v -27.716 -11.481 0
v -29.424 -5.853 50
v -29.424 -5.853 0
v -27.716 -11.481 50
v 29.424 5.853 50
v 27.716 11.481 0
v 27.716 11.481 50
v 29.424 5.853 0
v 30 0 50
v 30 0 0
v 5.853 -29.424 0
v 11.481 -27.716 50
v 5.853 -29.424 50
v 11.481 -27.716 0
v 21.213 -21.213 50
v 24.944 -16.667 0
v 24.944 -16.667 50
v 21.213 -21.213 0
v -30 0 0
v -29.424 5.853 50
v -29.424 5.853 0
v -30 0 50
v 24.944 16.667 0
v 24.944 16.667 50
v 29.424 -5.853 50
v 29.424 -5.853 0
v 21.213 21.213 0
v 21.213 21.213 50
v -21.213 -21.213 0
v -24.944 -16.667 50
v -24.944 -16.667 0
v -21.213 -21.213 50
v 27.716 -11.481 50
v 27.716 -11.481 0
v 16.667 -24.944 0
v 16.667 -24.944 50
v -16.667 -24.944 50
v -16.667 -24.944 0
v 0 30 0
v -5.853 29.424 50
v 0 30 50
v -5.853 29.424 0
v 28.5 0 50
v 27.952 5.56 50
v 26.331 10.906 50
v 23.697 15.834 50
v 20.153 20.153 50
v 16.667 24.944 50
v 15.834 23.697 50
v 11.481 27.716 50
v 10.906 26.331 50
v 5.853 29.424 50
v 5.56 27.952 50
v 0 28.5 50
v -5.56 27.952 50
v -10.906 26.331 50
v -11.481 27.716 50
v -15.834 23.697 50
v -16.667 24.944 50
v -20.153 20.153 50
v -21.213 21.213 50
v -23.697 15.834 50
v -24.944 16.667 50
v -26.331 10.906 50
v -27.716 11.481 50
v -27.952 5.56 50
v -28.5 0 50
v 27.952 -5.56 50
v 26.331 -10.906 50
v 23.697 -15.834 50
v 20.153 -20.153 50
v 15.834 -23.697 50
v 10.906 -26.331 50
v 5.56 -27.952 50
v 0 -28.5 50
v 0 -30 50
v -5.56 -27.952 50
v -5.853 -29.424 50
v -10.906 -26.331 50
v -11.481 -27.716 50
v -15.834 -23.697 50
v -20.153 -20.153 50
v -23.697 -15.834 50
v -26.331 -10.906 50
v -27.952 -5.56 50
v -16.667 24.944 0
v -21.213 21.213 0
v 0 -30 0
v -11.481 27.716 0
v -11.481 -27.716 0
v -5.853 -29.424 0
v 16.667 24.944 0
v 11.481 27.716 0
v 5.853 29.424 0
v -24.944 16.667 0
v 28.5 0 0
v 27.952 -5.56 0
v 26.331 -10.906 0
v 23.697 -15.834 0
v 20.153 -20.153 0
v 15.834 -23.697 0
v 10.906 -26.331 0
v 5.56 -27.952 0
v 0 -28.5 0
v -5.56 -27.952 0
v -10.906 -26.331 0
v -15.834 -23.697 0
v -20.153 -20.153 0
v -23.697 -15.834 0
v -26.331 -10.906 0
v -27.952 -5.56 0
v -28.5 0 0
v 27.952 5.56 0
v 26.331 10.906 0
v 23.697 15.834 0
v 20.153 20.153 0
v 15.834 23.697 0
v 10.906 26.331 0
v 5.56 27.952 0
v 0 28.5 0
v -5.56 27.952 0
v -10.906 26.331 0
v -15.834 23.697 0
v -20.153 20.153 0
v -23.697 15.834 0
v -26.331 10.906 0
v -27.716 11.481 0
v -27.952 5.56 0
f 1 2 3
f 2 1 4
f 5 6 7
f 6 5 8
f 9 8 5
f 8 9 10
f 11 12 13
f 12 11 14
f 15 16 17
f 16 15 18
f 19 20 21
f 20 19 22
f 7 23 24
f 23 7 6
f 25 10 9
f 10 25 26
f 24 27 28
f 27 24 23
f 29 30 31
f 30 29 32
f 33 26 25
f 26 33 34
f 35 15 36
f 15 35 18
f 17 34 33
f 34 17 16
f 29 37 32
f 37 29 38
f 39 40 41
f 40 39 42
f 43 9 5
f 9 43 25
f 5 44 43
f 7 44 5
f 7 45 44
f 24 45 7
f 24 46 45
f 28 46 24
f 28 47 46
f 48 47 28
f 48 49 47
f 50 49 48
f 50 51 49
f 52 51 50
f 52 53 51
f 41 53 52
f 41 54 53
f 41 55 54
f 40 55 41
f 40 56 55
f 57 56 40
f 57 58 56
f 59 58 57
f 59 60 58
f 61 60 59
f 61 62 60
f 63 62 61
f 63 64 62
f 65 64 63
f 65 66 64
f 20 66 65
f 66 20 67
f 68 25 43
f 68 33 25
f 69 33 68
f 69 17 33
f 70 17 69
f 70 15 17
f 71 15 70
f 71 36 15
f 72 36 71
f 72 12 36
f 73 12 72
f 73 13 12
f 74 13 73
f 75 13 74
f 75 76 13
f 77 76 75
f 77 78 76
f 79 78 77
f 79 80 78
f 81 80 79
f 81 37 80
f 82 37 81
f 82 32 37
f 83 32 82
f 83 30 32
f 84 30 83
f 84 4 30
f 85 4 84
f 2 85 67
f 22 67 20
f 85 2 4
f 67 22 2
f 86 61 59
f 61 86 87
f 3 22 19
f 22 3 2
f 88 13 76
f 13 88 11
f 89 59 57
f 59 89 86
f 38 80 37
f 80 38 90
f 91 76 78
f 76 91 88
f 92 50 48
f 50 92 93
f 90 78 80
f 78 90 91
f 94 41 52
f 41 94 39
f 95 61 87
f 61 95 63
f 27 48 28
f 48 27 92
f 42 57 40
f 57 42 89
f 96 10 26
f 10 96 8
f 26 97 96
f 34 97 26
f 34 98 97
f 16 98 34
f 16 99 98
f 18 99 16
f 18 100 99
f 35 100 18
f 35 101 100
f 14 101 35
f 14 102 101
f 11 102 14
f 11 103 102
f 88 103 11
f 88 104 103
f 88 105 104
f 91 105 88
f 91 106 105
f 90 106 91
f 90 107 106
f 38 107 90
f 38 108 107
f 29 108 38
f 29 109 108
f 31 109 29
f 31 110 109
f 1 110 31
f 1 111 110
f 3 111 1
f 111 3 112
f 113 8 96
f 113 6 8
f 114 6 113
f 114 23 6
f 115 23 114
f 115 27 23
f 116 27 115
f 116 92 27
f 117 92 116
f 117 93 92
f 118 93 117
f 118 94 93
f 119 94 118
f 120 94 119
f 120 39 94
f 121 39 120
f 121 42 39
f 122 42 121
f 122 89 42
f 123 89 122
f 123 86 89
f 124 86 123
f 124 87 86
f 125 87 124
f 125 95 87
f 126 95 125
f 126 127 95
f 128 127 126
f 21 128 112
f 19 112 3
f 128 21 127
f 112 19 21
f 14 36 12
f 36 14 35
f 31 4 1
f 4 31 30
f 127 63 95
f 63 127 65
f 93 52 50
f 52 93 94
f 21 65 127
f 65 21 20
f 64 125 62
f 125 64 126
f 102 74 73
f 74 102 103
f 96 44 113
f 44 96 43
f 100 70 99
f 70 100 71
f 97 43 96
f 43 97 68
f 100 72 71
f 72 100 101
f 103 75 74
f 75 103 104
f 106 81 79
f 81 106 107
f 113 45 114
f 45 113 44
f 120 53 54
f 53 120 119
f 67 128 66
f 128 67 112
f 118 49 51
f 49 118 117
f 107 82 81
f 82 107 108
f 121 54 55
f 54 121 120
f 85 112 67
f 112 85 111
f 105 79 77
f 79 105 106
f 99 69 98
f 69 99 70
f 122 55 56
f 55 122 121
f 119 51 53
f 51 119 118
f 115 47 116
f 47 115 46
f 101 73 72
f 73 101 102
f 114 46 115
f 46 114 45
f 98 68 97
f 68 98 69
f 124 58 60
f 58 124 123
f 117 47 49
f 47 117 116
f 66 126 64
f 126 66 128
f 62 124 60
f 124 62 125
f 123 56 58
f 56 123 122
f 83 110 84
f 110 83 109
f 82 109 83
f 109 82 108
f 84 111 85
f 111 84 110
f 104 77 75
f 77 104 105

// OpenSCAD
$fn = 32;

// ----------------------------------------------------------------------
// Thin tube: 1.5 mm wall
// ----------------------------------------------------------------------

// --- parameters (mm) ---
tube_od = 60;             // outer diameter
tube_h = 50;              // height, Z
wall = 1.5;               // wall thickness
fit_tol = 0.05;           // tolerance for press fits, mm
free_tol = 0.3;           // tolerance for clearance fits, mm

difference() {
  cylinder(h = tube_h, d = tube_od);
  translate([0, 0, -1]) cylinder(h = tube_h + 2, d = tube_od - 2 * wall);
}
